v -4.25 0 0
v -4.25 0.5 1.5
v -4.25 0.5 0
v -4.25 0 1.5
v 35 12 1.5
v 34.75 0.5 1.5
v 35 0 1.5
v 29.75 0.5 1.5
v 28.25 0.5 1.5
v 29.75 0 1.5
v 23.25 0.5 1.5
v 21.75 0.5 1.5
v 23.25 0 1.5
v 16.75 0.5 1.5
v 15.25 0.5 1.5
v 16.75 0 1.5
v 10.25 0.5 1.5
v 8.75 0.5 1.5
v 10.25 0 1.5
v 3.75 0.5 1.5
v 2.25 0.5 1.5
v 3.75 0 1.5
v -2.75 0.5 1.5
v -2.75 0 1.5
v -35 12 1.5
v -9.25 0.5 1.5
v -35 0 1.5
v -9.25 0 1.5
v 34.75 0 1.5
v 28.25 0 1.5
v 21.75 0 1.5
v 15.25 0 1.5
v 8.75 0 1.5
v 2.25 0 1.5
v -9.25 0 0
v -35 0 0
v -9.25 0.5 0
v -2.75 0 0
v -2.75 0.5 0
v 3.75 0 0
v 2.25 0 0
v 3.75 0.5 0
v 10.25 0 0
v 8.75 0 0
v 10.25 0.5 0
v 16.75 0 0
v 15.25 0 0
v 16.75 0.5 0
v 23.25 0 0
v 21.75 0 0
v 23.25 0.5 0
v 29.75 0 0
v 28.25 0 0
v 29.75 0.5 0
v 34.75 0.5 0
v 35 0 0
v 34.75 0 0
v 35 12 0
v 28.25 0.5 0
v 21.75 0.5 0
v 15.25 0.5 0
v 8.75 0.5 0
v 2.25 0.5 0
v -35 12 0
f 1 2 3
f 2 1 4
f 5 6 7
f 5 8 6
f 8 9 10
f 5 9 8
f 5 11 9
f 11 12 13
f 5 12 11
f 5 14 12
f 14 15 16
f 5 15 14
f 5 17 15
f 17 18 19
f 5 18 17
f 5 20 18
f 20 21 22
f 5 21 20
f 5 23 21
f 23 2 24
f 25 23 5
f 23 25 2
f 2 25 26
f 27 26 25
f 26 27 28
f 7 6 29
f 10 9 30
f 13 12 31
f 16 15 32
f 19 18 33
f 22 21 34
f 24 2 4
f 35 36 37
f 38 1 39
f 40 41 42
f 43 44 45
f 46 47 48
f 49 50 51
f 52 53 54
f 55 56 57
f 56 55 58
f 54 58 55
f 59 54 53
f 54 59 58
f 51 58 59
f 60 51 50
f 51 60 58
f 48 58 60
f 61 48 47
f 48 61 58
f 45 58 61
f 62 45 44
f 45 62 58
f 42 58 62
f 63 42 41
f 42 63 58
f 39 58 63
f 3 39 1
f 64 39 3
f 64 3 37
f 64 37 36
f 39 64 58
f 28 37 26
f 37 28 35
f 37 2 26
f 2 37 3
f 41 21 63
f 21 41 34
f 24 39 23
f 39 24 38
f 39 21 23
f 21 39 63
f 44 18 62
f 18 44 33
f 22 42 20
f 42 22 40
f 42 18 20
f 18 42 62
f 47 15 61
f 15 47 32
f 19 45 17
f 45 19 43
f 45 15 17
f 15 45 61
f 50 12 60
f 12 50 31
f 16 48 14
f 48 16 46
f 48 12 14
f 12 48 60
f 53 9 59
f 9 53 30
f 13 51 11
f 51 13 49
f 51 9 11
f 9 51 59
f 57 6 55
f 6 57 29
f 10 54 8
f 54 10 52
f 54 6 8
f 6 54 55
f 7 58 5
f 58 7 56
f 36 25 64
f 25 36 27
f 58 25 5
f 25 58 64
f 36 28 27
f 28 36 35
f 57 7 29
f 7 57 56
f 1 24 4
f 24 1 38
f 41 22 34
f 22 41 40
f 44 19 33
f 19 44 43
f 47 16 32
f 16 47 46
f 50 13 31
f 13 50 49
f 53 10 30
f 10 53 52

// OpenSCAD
// 10-well comb for agarose gel casting
// Printed lying flat on the bed, teeth pointing down in -Y

$fn = 64;

// ---- Dimensions (mm) ----
spine_len    = 70;    // spine length (X)
spine_wid    = 12;    // spine width (Y)
tooth_w      = 5;     // tooth width (X)
tooth_len    = 12;    // tooth length (Y)
gap          = 1.5;   // gap between teeth (X)
thickness    = 1.5;   // plate thickness (Z)
overcut      = 0.5;   // cutter overshoot past faces

n_teeth      = 10;    // number of teeth
row_span     = (n_teeth - 1) * gap;  // span of gaps
x_start      = -row_span / 2;        // first tooth centre (row centred)

// ---- Model ----
difference() {
    // Spine
    translate([-spine_len/2, 0, 0])
        cube([spine_len, spine_wid, thickness]);

    // Teeth
    for (i = [0 : n_teeth - 1])
        translate([x_start + i * (tooth_w + gap) - tooth_w/2,
                   -tooth_len,
                   0])
            cube([tooth_w, tooth_len + overcut, thickness]);
}
